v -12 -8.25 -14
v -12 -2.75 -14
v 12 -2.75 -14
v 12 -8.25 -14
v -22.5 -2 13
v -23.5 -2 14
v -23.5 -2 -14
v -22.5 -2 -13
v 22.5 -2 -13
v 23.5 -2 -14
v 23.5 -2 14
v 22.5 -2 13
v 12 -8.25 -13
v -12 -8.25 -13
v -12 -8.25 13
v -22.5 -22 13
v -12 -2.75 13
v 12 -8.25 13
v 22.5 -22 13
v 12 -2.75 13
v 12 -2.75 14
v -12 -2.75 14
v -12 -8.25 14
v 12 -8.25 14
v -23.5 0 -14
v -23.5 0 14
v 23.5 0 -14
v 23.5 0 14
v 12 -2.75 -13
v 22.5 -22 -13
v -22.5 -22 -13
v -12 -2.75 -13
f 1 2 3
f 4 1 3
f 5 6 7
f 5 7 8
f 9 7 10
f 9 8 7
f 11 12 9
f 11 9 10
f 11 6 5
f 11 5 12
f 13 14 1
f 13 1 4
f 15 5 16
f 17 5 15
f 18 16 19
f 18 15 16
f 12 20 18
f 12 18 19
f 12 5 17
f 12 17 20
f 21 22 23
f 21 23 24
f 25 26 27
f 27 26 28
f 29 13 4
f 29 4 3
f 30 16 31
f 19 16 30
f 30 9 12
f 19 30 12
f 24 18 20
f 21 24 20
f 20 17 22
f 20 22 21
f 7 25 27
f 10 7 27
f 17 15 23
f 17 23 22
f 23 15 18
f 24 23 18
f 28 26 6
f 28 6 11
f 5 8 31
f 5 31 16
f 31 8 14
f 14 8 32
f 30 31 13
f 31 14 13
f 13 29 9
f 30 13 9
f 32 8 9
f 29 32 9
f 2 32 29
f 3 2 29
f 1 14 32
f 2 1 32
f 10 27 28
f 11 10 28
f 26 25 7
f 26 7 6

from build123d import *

# Parameters (mm, degrees)
F0_W     = 45
F0_H     = 26
F1_DEPTH = 22
F0_W_2   = 47
F0_H_2   = 28
F2_DEPTH = 2
F3_W     = 24
F3_H     = 5.5
F4_DEPTH = 1


# Not quite as in the source:
# - a pattern or mirror of a feature is missing from the dataset's text; its kind, count and spacing are read off the source's solid


with BuildPart() as f1:
    # F0 (on Front) → F1 (new body)
    with BuildSketch(Plane.XZ):
        Rectangle(F0_W, F0_H)
    extrude(amount=F1_DEPTH)

    # F0 (on Front) → F2 (join)
    with BuildSketch(Plane.XZ):
        Rectangle(F0_W_2, F0_H_2)
        Rectangle(F0_W, F0_H, mode=Mode.SUBTRACT)
    extrude(amount=F2_DEPTH)

    # F3 (on face) → F4 (join)
    with BuildSketch(Plane.XY.offset(13)):
        with Locations((0, -5.5)):
            Rectangle(F3_W, F3_H)
    f4 = extrude(amount=F4_DEPTH)

    # F4_copies: F4 across plane
    add(f4.mirror(Plane(origin=(0, 0, 0), x_dir=(-1, 0, 0), z_dir=(0, 0, -1))))


solid = f1.part
